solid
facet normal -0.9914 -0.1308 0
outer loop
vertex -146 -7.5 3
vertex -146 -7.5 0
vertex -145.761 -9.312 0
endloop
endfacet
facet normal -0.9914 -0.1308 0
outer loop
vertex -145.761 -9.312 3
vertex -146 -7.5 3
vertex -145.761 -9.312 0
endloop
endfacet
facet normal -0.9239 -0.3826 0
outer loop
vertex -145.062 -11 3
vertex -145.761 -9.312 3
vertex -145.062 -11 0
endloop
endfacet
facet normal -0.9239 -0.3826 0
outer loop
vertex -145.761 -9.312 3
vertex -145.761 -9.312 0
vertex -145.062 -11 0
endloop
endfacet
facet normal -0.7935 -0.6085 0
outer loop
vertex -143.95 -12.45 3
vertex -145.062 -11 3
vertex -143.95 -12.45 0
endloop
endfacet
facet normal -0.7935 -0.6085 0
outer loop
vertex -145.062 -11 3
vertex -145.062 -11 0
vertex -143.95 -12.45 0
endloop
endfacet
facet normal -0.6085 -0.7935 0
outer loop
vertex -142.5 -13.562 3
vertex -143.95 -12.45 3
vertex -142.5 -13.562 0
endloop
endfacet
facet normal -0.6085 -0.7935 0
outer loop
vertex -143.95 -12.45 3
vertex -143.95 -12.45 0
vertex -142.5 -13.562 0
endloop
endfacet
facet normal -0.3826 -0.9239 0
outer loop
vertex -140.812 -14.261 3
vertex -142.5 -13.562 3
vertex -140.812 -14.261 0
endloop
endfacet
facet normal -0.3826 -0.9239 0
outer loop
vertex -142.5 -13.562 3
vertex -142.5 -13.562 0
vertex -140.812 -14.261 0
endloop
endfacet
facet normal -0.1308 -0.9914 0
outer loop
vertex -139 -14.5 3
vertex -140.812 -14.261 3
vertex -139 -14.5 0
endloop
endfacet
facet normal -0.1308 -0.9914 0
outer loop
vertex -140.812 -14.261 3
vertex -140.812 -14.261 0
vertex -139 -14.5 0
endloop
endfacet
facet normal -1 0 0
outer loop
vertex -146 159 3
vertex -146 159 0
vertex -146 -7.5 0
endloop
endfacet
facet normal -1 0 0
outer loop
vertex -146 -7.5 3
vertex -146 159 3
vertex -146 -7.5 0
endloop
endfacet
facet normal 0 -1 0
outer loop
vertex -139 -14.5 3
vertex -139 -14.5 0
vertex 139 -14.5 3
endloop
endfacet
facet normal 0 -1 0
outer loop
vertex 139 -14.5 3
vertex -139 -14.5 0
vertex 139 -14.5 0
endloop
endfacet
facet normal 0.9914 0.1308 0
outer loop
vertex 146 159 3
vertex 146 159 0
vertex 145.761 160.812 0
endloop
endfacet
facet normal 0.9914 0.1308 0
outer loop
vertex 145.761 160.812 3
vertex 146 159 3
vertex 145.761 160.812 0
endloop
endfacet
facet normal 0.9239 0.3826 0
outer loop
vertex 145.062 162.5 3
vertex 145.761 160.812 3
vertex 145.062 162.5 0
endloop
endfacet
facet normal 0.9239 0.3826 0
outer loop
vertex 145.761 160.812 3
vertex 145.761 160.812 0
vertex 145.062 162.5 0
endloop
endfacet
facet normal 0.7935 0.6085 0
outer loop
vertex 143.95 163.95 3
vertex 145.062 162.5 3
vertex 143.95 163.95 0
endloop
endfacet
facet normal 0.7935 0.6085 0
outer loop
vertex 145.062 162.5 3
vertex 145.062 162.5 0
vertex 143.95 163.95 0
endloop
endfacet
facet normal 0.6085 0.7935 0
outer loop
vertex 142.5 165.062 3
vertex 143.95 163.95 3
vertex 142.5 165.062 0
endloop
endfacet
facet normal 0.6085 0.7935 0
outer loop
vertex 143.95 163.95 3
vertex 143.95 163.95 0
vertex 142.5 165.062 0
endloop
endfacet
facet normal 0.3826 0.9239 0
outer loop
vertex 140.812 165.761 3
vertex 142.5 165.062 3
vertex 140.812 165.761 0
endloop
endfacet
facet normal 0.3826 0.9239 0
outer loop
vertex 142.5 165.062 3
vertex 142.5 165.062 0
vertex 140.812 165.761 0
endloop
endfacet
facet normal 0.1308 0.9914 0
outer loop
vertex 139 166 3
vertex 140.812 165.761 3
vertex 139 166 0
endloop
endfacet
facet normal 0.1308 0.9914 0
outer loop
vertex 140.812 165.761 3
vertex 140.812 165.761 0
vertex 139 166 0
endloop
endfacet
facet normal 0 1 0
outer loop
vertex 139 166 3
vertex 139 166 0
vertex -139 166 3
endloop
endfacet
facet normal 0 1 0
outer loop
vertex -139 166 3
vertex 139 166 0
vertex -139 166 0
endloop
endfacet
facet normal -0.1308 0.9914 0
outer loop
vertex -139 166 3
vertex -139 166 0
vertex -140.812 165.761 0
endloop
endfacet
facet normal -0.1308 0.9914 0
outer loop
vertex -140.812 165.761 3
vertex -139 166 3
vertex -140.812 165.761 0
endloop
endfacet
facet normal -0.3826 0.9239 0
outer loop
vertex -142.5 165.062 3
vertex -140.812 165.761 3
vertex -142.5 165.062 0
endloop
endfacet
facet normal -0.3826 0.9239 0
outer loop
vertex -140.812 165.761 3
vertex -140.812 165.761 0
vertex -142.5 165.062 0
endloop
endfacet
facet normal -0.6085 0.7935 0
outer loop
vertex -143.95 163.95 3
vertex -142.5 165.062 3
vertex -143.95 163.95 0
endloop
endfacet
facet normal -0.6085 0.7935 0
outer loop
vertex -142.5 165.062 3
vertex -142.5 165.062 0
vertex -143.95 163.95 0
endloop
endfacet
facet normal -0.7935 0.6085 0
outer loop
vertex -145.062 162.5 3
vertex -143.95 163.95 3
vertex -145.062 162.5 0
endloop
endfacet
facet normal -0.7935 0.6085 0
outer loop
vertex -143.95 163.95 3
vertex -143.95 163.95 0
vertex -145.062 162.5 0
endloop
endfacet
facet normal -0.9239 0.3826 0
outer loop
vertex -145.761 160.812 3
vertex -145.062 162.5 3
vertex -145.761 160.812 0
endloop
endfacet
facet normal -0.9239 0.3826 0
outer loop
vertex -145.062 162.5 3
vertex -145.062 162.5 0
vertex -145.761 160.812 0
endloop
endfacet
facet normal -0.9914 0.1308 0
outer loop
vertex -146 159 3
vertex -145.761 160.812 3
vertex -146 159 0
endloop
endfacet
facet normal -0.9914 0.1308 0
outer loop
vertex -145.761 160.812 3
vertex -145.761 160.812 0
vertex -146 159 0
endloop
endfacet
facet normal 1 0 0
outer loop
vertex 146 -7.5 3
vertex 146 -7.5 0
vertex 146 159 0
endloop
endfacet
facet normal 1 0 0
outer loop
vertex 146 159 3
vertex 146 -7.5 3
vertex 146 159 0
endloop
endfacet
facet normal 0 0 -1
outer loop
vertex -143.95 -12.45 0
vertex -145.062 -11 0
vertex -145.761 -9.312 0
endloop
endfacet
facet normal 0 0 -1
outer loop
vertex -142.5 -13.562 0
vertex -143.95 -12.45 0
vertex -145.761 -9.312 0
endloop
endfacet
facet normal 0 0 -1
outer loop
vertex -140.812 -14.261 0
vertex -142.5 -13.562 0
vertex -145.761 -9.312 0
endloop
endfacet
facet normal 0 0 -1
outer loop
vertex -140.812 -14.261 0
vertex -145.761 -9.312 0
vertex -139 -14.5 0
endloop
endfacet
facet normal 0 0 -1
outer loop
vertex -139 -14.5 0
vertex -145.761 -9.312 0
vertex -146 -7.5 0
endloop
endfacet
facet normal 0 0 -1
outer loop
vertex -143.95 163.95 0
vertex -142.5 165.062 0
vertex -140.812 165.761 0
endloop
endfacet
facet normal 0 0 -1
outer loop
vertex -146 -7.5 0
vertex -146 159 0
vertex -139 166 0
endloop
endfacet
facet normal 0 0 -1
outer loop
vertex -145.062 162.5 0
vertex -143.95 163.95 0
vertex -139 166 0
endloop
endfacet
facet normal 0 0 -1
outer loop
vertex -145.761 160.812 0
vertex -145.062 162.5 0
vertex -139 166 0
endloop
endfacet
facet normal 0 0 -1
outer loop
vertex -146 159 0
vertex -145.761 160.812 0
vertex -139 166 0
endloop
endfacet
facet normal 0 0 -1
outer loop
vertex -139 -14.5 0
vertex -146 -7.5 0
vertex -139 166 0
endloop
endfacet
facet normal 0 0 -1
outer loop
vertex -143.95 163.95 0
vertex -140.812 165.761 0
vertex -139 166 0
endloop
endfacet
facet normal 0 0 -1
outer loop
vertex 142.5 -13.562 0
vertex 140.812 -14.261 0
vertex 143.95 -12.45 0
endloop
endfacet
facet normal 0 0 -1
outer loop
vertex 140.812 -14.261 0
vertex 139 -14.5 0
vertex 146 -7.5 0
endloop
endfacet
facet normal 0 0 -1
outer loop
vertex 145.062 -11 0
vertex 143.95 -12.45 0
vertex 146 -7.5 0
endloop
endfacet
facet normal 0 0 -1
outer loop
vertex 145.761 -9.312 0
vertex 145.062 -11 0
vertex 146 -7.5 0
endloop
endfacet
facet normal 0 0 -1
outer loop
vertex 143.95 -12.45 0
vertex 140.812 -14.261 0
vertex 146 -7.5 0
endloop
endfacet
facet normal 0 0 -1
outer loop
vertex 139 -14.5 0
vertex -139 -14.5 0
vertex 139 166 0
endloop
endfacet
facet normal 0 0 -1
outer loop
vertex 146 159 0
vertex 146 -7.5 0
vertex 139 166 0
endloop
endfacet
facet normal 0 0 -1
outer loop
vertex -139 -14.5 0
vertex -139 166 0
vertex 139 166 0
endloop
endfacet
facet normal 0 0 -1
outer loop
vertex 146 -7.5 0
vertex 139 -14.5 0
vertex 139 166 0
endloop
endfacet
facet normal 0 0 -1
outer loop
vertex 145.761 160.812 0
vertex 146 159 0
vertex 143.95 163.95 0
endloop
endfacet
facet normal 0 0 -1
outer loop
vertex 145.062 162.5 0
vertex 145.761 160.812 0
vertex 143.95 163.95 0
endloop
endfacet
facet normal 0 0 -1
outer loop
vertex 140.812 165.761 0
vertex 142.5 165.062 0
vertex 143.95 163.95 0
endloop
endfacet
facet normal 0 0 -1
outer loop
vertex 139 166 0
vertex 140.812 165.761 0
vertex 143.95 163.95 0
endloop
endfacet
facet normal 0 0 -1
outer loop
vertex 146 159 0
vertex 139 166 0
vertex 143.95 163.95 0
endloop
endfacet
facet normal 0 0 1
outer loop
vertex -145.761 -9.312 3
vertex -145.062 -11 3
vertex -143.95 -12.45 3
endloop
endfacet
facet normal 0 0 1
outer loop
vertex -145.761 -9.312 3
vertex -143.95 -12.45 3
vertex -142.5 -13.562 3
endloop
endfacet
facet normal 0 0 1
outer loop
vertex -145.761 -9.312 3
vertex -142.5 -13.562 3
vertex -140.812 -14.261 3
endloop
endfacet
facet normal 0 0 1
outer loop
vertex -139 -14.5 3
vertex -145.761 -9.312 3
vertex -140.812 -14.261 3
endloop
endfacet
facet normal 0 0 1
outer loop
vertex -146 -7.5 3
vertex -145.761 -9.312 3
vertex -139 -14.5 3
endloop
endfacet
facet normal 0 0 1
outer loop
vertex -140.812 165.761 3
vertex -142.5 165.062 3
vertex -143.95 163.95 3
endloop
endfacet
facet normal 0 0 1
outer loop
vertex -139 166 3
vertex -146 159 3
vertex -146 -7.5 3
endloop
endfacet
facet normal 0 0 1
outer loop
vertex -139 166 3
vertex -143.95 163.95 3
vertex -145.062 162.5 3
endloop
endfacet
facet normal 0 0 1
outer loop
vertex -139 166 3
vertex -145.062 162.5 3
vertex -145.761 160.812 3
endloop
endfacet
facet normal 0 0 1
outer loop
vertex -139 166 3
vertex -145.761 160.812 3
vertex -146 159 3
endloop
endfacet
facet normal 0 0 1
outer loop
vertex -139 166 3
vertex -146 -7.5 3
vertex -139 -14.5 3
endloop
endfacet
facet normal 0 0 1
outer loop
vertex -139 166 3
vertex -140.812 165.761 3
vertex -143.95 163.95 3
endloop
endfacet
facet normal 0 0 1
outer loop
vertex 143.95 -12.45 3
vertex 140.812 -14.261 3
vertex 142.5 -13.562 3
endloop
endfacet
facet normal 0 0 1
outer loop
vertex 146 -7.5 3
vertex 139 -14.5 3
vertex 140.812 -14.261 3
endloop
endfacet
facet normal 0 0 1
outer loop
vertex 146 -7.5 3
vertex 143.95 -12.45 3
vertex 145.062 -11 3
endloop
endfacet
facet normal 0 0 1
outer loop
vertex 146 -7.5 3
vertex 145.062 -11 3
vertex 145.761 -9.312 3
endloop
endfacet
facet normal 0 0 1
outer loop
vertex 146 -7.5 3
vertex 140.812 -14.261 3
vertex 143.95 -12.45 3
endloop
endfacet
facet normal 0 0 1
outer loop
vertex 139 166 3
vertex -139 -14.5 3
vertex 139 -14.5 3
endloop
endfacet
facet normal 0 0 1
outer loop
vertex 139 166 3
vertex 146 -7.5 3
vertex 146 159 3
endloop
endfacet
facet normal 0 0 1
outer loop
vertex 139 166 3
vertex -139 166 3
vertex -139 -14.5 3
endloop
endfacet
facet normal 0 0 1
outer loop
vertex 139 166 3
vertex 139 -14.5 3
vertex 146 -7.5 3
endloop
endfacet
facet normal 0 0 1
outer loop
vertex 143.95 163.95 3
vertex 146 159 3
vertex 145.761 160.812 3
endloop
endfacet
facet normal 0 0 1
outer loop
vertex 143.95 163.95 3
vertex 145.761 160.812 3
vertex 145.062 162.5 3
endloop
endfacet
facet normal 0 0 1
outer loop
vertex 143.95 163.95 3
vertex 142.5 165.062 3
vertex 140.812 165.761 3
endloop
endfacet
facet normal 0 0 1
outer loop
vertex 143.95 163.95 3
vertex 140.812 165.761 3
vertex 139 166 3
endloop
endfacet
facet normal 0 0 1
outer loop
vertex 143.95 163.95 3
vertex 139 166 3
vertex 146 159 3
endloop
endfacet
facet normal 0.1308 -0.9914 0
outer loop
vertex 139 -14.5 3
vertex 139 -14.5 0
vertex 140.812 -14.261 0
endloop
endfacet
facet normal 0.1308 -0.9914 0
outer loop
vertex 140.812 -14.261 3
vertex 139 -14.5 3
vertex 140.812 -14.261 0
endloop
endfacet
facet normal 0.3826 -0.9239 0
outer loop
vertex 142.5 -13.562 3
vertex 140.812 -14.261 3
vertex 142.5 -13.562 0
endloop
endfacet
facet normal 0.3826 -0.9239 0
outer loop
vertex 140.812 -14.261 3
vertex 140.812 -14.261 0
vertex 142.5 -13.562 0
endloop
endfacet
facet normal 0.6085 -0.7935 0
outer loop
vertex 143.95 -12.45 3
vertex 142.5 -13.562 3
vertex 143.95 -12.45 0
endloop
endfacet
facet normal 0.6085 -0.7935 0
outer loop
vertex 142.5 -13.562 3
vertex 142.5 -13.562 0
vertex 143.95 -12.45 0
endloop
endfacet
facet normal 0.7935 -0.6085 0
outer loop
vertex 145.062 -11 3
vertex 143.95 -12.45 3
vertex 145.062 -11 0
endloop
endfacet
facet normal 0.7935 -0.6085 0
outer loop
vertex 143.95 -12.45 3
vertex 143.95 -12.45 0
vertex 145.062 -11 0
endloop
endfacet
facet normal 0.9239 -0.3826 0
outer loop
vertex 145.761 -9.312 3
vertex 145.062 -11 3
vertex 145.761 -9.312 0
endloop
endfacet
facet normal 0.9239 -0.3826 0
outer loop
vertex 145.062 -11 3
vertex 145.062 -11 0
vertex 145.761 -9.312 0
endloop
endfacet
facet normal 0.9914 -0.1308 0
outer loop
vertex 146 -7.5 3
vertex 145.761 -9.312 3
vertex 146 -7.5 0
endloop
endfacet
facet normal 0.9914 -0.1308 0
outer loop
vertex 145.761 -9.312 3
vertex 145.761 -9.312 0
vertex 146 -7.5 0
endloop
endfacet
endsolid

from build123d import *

# Parameters (mm, degrees)
F0_W     = 292
F0_H     = 25
F0_H_2   = 15
F1_DEPTH = 3


with BuildPart() as f1:
    # F0 (on Top) → F1 (new body)
    with BuildSketch(Plane.XY):
        with BuildLine():
            Line((-146, 159), (-146, 141))
            Line((-146, 141), (146, 141))
            Line((146, 141), (146, 159))
            ThreePointArc((146, 159), (143.949747, 163.949747), (139, 166))
            Line((139, 166), (-139, 166))
            ThreePointArc((-139, 166), (-143.949747, 163.949747), (-146, 159))
        make_face()
        with Locations((0, 128.5)):
            Rectangle(F0_W, F0_H)
        with Locations((0, 103.5)):
            Rectangle(F0_W, F0_H)
        with Locations((0, 78.5)):
            Rectangle(F0_W, F0_H)
        with Locations((0, 53.5)):
            Rectangle(F0_W, F0_H)
        with Locations((0, 28.5)):
            Rectangle(F0_W, F0_H)
        with Locations((0, 8.5)):
            Rectangle(F0_W, F0_H_2)
        with BuildLine():
            ThreePointArc((-146, -7.5), (-143.949747, -12.449747), (-139, -14.5))
            Line((-139, -14.5), (139, -14.5))
            ThreePointArc((139, -14.5), (143.949747, -12.449747), (146, -7.5))
            Line((146, -7.5), (146, 1))
            Line((146, 1), (-146, 1))
            Line((-146, 1), (-146, -7.5))
        make_face()
    extrude(amount=F1_DEPTH)


solid = f1.part
